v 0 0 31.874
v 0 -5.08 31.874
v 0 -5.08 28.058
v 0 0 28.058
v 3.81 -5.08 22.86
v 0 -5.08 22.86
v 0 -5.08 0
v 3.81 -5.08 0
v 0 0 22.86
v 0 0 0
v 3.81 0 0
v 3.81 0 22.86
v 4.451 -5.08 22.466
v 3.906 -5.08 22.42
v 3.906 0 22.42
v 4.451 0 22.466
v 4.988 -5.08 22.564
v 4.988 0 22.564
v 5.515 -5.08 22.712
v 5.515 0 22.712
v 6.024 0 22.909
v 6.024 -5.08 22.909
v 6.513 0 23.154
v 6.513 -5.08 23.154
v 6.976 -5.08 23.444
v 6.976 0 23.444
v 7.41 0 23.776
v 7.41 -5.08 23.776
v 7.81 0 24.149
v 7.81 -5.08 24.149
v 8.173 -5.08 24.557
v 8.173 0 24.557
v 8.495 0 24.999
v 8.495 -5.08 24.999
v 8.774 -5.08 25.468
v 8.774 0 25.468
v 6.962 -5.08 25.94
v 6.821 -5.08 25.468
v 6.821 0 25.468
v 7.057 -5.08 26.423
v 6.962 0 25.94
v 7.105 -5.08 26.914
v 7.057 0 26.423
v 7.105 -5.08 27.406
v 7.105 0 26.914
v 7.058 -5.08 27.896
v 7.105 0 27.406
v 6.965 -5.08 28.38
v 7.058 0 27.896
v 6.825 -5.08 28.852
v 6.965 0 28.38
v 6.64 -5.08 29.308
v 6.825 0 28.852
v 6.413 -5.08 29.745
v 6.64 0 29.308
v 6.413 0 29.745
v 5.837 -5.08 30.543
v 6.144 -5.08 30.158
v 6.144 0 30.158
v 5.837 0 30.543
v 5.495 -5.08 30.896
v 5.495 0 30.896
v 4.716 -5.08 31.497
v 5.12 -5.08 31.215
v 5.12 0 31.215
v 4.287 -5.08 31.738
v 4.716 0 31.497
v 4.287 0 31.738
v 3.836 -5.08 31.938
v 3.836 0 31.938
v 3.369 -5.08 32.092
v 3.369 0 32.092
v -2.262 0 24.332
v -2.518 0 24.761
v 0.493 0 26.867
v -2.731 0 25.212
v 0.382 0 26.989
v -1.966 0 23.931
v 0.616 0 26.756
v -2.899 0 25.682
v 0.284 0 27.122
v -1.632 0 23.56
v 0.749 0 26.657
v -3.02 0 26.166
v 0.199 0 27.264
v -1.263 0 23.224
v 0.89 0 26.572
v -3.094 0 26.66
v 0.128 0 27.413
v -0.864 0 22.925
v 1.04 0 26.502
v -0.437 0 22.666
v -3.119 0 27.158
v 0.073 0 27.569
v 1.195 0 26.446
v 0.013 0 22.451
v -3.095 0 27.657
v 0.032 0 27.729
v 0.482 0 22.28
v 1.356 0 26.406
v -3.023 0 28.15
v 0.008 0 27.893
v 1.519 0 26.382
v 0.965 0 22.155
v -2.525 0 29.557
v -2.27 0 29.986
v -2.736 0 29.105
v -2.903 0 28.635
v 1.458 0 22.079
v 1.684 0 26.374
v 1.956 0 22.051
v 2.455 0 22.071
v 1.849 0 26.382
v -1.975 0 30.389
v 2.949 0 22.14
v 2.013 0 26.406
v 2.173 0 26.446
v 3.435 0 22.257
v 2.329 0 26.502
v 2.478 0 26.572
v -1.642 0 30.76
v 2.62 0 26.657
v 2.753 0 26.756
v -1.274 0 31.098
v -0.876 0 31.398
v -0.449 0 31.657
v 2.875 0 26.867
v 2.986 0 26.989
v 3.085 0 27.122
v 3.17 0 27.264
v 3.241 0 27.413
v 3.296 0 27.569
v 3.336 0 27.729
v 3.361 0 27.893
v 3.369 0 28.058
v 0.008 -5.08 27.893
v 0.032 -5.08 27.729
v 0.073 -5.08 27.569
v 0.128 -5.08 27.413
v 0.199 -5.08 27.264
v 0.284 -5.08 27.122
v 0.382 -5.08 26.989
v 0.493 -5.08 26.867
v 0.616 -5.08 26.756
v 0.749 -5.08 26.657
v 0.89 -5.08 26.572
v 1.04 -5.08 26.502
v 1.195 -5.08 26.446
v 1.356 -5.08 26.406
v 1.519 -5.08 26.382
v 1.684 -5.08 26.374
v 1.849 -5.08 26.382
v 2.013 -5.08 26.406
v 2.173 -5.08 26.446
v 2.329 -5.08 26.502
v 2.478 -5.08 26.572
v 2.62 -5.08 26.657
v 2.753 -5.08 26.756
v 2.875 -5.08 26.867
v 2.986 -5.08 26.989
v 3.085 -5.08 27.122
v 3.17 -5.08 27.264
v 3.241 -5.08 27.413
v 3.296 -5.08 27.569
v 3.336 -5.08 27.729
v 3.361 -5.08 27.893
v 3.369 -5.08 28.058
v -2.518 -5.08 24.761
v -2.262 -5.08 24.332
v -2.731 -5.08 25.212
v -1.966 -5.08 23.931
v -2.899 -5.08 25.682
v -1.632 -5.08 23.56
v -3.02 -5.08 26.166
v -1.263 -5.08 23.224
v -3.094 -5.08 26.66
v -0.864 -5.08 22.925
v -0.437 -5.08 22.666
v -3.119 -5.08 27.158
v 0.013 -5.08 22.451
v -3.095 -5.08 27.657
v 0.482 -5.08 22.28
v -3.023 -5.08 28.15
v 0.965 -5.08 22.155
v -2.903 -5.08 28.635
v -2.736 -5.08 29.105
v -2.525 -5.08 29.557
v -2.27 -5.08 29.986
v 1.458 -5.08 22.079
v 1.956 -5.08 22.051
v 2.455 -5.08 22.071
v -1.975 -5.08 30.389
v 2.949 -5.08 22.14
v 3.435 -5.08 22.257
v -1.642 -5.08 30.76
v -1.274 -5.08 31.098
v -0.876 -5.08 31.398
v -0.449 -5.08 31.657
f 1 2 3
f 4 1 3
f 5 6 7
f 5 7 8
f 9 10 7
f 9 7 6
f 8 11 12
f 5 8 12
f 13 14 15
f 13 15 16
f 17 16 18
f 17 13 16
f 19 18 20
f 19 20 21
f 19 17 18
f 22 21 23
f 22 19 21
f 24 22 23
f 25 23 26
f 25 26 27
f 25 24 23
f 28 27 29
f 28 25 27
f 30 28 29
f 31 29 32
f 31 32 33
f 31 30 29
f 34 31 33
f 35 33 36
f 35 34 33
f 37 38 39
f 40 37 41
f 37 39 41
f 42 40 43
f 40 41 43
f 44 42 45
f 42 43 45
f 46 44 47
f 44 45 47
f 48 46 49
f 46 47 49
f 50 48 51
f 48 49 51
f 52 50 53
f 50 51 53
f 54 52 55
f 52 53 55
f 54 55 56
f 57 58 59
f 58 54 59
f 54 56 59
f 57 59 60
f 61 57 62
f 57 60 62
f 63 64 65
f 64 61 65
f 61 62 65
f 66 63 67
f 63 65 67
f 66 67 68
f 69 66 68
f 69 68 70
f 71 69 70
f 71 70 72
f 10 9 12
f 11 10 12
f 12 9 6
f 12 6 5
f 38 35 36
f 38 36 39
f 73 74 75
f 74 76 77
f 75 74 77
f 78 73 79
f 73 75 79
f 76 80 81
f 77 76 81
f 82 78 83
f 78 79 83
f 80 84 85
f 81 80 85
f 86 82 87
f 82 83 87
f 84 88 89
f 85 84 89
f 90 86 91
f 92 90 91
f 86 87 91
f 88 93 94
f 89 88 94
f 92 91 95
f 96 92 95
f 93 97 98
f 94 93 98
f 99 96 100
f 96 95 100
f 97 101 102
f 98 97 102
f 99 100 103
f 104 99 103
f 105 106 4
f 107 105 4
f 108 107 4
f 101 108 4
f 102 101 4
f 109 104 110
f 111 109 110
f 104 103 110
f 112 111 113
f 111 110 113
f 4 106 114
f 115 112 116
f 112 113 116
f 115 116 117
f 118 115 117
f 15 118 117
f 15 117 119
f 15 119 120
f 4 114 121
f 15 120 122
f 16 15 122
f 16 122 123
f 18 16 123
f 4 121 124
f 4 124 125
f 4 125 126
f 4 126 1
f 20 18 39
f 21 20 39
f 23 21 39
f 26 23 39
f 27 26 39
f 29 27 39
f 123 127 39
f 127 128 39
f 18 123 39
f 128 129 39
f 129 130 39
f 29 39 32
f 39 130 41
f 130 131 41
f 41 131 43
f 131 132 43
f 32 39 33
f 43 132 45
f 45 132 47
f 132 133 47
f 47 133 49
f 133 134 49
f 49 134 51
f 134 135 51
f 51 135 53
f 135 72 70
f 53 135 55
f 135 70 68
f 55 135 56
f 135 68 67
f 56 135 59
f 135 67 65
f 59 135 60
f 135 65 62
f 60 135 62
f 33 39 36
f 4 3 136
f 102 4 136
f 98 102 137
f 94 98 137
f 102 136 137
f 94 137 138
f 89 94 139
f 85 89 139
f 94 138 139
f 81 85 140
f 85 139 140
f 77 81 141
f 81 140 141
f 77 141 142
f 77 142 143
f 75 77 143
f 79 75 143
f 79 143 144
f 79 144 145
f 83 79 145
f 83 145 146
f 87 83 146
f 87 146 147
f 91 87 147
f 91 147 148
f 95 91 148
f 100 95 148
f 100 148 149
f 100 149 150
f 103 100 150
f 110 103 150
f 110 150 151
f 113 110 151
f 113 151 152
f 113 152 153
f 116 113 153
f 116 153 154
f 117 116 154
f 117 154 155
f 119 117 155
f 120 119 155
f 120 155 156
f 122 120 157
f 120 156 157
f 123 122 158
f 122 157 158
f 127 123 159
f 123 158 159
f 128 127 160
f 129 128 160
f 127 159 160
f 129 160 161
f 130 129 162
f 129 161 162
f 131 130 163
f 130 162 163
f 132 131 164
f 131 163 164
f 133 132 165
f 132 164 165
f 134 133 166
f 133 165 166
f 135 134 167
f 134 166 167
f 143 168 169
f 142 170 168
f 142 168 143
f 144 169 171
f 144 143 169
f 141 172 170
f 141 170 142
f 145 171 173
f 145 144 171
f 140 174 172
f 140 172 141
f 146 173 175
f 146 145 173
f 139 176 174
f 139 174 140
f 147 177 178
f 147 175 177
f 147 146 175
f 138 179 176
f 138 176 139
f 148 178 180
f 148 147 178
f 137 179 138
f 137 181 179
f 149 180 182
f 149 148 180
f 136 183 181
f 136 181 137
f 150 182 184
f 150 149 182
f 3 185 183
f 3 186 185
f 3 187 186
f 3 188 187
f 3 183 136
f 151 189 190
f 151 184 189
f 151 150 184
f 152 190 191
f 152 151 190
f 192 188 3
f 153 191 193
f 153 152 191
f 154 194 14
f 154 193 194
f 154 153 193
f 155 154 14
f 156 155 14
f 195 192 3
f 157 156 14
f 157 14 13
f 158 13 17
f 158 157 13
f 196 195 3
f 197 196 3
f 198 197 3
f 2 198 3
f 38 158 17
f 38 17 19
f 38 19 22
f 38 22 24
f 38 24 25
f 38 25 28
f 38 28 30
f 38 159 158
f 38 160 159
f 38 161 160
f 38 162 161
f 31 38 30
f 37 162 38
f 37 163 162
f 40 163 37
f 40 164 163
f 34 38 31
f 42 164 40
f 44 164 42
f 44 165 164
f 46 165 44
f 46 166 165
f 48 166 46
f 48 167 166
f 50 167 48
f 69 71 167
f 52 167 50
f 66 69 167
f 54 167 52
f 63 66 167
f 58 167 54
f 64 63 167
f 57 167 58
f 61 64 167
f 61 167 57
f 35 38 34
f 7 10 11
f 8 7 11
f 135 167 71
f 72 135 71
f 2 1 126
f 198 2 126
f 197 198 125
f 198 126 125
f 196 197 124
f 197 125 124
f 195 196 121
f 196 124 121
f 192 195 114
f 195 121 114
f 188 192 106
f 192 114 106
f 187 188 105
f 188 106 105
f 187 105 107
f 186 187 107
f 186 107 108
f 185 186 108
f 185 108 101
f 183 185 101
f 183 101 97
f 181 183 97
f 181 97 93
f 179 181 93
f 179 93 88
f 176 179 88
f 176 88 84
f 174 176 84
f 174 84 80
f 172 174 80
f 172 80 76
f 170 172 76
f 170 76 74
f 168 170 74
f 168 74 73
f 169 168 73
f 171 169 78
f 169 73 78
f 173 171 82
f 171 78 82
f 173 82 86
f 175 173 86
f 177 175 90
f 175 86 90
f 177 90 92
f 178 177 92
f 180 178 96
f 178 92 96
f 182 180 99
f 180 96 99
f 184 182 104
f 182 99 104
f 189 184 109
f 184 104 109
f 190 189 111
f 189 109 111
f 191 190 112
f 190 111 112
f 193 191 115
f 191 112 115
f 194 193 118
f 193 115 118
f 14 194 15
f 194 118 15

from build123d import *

# Parameters (mm, degrees)
F1_R     = 5.114750284
F2_DEPTH = 5.08
F0_W     = 3.81
F0_H     = 22.86
F4_DEPTH = 5.081
F6_DEPTH = 5.08


with BuildPart() as f2:
    # F1 (on Front) → F2 (new body)
    with BuildSketch(Plane.XZ):
        with Locations((1.9960911013, 27.1652003531)):
            Circle(F1_R)
    extrude(amount=F2_DEPTH)

    # F3 (on face) → F4 (cut, through all)
    with BuildSketch(Plane.XZ.offset(5.08)):
        with BuildLine():
            Line((3.3687153245, 28.0579085851), (3.3687153245, 32.0923266159))
            ThreePointArc((3.3687153245, 32.0923266159), (1.6658580479, 32.269278781), (0, 31.8743712762))
            Line((0, 31.8743712762), (0, 28.0579085851))
            ThreePointArc((0, 28.0579085851), (1.6843576623, 26.3735509229), (3.3687153245, 28.0579085851))
        make_face()
    extrude(amount=-F4_DEPTH, mode=Mode.SUBTRACT)

    # F5 (on face) → F6 (join)
    with BuildSketch(Plane.XZ.offset(5.08)):
        with BuildLine():
            Line((8.7744330163, 25.4684417613), (6.8212005041, 25.4684417613))
            ThreePointArc((6.8212005041, 25.4684417613), (5.6923928708, 23.6299459498), (3.9059721433, 22.4204111193))
            ThreePointArc((3.9059721433, 22.4204111193), (6.7479771265, 23.2931093577), (8.7744330163, 25.4684417613))
        make_face()
    extrude(amount=-F6_DEPTH)


with BuildPart() as f2b:
    # F0 (on Front) → F2, piece 2 (new body)
    with BuildSketch(Plane.XZ):
        with Locations((1.905, 11.43)):
            Rectangle(F0_W, F0_H)
    extrude(amount=F2_DEPTH)


solid = Compound([f2.part, f2b.part])
